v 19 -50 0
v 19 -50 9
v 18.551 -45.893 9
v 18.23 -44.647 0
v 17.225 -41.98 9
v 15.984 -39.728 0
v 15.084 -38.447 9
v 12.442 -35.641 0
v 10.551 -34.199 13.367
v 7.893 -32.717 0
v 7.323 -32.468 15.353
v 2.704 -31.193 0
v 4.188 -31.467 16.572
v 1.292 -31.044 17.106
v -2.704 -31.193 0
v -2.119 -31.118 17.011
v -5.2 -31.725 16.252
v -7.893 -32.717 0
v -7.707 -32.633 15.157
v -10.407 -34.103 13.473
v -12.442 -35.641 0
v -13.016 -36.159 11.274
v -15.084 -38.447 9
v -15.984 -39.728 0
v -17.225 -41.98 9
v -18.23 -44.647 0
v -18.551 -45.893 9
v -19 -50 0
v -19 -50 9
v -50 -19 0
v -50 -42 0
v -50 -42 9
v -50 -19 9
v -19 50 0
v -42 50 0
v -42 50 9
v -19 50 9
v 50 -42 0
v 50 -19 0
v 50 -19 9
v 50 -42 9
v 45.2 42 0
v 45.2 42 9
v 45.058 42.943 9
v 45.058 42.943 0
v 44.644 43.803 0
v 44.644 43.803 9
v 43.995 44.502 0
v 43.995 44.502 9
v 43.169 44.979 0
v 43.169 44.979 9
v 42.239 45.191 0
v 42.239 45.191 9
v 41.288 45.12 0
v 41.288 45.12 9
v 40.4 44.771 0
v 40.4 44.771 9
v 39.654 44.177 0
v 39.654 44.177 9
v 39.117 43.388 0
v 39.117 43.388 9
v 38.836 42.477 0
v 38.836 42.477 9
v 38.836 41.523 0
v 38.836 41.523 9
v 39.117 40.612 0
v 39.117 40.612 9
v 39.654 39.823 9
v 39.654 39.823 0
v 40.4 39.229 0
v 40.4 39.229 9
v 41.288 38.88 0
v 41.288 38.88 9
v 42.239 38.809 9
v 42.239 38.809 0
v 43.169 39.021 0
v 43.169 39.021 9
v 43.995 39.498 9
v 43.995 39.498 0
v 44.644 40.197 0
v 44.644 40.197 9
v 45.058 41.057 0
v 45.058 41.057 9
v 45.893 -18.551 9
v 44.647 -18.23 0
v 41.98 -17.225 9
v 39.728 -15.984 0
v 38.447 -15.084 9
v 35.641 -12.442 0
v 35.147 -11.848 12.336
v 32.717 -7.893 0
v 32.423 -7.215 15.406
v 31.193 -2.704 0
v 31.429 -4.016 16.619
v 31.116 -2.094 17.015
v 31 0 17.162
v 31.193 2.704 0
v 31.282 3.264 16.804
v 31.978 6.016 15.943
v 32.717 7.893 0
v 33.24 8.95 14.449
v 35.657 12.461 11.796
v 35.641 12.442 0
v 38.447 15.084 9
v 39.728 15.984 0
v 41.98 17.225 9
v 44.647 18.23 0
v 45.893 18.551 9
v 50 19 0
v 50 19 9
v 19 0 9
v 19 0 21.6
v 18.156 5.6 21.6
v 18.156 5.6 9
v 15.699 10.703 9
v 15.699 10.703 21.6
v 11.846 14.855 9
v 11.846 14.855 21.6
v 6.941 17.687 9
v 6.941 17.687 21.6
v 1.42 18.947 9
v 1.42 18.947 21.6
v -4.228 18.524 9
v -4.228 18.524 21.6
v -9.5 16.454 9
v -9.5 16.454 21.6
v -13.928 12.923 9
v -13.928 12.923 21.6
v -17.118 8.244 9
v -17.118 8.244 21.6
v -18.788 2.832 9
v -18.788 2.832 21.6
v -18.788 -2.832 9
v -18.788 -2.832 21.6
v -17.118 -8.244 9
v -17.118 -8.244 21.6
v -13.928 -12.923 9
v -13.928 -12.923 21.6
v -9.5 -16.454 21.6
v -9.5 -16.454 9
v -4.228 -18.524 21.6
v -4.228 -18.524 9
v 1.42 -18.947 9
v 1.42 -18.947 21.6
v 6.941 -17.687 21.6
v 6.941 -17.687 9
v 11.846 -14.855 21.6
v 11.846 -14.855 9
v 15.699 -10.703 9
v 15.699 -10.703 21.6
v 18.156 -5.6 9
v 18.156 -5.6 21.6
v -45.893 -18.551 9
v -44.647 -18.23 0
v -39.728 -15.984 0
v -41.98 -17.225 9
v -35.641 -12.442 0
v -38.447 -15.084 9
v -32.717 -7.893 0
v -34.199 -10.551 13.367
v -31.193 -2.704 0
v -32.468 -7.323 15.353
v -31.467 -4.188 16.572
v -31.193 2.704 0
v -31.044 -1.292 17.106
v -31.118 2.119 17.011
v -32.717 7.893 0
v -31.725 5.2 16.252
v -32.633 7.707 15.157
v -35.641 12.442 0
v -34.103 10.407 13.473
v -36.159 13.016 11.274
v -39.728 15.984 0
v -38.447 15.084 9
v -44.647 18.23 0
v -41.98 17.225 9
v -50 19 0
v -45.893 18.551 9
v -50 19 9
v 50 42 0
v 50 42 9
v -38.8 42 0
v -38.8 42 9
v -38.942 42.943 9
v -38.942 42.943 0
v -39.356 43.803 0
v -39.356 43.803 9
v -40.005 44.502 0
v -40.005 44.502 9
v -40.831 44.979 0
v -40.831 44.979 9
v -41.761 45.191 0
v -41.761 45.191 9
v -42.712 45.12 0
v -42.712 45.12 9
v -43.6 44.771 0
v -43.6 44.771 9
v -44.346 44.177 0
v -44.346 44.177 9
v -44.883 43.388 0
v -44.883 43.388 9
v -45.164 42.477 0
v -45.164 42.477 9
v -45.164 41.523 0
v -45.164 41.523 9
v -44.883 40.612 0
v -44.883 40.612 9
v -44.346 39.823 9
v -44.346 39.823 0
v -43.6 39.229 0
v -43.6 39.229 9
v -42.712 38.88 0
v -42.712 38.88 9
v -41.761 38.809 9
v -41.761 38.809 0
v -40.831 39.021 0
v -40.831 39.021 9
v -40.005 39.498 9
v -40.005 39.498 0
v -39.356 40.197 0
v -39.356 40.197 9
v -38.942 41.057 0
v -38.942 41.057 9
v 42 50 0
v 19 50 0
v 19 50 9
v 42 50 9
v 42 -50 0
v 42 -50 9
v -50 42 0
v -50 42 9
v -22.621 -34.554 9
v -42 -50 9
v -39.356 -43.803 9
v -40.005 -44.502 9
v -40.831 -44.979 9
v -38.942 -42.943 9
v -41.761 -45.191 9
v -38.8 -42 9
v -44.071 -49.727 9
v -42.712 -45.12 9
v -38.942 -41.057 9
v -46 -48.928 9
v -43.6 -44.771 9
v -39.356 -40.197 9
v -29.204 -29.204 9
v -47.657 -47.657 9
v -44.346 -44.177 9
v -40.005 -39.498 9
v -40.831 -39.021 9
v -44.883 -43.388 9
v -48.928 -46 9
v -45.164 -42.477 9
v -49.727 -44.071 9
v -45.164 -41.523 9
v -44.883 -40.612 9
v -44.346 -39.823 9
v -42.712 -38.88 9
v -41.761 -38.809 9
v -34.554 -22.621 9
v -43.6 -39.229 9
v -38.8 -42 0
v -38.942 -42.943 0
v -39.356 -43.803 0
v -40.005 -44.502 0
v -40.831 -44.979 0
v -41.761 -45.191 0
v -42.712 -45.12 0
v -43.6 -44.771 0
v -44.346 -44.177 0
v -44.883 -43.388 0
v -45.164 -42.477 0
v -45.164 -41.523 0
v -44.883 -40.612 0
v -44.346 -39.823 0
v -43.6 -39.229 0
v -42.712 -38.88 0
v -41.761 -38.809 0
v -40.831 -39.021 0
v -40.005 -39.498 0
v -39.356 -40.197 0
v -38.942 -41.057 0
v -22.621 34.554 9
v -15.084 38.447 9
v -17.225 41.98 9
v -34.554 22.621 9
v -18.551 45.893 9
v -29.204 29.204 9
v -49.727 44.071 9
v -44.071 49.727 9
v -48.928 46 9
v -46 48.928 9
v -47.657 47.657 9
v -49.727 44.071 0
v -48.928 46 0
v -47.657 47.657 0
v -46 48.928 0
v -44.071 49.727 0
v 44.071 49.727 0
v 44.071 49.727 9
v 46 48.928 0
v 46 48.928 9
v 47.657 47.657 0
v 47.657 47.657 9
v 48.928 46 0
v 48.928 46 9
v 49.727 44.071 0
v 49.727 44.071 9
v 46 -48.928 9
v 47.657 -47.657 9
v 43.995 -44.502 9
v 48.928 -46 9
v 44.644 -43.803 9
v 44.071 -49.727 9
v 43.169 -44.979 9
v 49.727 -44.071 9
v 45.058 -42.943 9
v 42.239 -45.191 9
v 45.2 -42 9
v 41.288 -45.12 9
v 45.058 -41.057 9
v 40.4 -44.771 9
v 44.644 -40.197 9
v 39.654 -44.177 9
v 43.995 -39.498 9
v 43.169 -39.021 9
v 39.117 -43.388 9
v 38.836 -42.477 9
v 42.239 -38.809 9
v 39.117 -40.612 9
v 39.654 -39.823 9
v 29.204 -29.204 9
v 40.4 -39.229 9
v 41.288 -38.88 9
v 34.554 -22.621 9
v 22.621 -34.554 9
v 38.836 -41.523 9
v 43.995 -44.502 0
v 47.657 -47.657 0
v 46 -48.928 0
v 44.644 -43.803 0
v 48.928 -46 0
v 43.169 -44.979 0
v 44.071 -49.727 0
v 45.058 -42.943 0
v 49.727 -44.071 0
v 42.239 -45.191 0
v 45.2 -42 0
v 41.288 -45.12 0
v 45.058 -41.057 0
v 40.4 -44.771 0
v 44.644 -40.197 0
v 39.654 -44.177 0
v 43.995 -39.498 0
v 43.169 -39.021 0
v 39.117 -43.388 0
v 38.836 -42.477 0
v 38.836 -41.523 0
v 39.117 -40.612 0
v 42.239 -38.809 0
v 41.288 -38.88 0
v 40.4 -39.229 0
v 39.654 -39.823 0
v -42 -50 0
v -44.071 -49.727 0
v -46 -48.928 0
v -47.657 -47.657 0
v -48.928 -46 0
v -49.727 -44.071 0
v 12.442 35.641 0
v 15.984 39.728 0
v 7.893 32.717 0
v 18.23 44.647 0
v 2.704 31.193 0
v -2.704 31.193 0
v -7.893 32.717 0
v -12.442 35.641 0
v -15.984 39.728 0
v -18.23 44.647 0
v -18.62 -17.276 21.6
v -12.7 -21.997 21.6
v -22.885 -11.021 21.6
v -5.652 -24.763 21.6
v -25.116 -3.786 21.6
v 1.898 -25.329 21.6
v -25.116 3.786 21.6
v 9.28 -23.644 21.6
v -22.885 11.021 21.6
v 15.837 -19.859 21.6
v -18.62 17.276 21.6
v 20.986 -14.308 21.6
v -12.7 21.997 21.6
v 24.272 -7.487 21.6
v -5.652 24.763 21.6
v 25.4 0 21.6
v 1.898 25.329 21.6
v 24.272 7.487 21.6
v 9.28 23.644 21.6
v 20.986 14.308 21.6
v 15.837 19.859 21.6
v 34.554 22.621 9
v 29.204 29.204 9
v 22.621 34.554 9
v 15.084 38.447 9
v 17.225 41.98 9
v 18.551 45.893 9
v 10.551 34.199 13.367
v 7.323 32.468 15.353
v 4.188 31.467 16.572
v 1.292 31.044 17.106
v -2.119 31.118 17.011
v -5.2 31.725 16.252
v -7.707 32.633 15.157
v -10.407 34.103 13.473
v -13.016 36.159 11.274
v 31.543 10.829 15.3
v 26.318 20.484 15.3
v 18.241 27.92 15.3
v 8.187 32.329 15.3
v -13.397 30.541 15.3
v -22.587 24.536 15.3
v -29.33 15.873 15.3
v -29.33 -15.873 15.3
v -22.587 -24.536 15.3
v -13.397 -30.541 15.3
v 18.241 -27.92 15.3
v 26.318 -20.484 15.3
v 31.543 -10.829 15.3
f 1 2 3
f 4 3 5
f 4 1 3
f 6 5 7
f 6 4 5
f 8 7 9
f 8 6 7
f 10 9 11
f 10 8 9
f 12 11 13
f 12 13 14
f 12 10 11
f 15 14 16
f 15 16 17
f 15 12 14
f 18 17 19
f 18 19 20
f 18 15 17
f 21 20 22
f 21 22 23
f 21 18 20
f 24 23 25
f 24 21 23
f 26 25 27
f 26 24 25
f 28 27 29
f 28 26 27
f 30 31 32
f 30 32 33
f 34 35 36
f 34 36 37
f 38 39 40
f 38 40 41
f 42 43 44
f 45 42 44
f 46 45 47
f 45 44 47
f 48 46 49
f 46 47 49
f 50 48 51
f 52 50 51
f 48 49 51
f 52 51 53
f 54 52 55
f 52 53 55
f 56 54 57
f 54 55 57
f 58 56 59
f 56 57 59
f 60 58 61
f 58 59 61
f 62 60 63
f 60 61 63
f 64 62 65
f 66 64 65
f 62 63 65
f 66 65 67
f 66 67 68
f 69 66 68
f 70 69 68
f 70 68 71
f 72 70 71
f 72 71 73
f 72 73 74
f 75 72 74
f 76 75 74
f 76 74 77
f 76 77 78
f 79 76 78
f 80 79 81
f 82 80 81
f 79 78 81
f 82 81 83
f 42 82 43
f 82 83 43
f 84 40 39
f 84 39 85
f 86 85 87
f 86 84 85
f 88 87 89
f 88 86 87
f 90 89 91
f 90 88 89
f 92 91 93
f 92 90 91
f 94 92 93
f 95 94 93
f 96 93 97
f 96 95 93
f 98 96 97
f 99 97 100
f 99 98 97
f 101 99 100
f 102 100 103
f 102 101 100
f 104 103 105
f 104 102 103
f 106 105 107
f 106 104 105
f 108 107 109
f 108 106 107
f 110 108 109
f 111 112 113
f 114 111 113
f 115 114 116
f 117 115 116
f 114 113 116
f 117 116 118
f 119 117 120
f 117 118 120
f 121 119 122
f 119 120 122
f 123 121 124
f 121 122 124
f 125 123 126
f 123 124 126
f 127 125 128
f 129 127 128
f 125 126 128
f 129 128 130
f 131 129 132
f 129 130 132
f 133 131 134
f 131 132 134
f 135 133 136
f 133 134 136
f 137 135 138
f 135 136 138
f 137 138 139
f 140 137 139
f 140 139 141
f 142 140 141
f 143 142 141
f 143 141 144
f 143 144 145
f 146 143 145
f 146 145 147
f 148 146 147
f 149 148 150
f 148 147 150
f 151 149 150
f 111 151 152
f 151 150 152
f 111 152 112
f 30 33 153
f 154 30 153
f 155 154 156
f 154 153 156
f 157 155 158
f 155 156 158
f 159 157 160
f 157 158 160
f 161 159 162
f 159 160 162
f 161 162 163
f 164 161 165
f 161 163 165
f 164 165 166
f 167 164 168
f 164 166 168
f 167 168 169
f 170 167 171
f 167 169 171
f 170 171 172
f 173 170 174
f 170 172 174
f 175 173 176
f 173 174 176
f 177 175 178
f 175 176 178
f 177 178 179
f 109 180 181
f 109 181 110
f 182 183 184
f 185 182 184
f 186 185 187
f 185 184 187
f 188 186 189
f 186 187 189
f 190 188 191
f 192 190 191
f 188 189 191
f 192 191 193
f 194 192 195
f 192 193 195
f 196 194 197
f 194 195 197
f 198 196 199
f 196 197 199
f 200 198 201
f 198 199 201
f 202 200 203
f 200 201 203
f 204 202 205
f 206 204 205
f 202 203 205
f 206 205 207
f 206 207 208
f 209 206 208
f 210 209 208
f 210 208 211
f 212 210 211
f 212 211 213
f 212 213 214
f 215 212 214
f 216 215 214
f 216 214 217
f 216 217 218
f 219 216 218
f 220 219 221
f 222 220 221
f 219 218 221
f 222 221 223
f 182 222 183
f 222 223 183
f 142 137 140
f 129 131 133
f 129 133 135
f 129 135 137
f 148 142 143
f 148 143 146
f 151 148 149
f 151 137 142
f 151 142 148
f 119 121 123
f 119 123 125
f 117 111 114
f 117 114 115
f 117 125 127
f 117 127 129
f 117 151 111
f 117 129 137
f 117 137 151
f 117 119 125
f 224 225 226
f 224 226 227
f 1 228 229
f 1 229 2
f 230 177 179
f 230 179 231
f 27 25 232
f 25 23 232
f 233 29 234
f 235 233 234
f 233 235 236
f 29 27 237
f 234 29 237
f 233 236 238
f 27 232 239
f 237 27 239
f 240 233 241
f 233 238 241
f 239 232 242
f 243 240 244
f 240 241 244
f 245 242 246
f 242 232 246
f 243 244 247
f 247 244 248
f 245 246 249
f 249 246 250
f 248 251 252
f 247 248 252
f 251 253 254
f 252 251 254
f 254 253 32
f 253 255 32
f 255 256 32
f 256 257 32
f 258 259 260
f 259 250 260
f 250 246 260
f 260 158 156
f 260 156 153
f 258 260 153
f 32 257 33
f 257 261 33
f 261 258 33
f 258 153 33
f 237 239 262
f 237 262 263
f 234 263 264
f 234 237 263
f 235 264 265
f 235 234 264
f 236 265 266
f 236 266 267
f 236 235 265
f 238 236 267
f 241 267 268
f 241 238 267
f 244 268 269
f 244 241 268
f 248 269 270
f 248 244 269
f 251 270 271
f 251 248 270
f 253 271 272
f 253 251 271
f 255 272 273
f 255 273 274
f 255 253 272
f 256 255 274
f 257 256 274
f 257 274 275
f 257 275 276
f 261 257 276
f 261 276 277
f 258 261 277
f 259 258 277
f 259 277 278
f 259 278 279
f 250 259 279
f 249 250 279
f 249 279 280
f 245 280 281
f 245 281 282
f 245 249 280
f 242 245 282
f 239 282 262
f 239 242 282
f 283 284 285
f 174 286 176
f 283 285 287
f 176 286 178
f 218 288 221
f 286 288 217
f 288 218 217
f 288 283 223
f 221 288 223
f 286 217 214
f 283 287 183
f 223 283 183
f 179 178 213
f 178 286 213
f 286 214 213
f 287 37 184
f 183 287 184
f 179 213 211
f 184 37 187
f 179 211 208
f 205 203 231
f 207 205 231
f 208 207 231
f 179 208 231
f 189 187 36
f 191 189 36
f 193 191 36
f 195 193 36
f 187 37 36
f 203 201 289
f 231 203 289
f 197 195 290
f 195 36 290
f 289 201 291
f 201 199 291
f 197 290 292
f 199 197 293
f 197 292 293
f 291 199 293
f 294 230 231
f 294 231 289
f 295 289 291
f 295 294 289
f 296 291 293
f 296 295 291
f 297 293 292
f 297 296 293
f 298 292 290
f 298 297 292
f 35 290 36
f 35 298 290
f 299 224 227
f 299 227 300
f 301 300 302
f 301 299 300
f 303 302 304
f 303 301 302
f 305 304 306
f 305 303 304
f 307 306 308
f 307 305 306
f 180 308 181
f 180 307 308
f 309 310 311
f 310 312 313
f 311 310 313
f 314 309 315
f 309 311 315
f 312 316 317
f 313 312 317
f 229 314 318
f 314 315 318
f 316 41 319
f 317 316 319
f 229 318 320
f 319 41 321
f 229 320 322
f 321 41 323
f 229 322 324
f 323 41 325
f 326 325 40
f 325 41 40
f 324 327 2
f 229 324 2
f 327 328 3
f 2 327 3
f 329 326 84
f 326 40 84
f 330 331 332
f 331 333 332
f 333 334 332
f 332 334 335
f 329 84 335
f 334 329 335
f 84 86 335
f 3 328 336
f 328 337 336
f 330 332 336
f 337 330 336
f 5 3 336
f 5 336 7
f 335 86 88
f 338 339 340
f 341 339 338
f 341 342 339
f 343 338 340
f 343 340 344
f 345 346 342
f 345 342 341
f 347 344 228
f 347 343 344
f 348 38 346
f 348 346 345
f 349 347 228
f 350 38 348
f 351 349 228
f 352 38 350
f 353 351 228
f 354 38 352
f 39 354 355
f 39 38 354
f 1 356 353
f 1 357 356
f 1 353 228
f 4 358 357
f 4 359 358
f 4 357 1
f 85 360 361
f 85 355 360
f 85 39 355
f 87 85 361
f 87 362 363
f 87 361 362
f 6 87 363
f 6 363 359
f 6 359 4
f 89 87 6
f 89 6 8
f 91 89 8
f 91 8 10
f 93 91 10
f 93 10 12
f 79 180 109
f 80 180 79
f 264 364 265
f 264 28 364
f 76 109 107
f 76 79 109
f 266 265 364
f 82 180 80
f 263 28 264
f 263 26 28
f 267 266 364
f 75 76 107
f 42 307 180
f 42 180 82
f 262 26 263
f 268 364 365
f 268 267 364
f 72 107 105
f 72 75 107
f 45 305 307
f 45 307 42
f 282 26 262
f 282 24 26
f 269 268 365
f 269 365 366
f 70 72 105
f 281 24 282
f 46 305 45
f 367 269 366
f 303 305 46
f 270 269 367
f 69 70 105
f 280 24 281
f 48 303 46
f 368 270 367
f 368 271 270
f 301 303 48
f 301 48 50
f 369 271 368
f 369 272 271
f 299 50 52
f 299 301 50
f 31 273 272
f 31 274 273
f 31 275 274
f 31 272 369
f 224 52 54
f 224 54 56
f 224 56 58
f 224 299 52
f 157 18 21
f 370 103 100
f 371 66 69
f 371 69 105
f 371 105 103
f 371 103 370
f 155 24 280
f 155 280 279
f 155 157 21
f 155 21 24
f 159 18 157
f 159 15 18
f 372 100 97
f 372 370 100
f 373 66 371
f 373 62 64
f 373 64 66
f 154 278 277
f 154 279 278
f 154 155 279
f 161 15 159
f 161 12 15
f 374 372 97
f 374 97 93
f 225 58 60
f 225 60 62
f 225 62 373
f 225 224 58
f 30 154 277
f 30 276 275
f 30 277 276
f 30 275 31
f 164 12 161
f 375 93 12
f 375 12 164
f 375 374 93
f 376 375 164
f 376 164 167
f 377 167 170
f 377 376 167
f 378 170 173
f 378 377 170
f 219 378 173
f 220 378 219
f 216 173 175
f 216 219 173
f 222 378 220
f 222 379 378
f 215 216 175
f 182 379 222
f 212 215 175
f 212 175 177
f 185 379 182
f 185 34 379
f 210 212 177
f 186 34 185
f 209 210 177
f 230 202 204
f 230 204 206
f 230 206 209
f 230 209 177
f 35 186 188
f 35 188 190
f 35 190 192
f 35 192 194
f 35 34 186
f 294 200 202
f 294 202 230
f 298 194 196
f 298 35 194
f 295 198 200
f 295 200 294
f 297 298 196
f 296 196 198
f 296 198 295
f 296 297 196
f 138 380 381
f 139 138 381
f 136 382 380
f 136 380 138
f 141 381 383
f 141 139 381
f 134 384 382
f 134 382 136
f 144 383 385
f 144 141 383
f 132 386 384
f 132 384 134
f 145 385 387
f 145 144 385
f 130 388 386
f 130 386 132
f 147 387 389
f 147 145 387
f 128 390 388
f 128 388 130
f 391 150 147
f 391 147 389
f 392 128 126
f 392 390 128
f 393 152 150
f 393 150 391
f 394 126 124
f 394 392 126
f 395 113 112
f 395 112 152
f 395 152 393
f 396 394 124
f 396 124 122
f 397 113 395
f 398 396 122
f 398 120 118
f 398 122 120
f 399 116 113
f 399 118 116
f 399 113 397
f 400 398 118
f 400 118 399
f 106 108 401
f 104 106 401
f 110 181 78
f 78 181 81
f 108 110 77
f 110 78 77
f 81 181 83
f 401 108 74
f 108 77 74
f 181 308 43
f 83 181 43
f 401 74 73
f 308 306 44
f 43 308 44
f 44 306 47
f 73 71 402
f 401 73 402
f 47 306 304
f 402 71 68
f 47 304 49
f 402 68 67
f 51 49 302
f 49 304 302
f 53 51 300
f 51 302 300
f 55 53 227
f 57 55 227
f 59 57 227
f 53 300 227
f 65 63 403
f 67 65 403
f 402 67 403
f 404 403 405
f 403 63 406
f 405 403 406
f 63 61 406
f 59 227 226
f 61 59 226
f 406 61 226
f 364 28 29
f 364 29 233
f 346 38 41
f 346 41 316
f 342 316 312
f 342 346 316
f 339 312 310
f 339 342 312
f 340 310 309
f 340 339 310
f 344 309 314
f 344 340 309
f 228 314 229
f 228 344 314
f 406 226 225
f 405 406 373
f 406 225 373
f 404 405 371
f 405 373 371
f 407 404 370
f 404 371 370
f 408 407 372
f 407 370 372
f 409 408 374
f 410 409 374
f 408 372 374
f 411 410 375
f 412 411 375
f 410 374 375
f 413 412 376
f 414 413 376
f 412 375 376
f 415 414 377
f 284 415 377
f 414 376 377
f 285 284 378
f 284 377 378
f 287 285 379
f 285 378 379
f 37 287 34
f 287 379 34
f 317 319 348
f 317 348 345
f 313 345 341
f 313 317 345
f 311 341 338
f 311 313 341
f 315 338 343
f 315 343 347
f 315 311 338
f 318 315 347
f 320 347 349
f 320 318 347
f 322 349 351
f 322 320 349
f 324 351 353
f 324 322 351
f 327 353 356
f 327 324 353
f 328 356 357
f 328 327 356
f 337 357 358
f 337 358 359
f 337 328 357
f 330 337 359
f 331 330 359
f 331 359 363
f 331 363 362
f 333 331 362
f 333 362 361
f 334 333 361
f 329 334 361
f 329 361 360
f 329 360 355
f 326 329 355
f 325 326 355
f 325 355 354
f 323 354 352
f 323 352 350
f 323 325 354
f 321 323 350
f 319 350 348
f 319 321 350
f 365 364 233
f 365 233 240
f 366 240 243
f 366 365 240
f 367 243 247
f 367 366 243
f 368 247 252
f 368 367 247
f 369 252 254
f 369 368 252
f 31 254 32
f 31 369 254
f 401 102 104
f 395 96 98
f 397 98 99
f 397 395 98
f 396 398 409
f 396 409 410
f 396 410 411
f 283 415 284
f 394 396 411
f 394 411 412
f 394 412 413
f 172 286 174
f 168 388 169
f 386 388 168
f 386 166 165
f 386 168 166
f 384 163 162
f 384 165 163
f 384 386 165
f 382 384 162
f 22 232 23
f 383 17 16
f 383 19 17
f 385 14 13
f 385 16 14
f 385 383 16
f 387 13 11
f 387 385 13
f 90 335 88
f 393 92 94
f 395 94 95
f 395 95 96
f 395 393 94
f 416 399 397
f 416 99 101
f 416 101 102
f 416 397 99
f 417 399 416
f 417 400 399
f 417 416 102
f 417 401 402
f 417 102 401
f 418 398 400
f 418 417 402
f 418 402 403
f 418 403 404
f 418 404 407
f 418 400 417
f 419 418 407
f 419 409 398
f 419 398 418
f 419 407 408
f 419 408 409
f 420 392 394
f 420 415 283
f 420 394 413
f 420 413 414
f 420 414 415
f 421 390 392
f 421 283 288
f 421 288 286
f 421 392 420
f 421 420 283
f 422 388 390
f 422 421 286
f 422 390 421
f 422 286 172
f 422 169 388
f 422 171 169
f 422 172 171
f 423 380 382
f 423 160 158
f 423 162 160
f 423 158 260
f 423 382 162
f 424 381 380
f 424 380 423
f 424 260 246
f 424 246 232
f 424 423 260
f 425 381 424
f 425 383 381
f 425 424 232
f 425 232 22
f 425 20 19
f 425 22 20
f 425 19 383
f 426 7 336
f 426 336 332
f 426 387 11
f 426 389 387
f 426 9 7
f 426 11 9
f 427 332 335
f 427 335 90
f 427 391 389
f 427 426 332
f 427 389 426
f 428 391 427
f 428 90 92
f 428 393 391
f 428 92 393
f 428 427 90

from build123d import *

# Parameters (mm, degrees)
BOSS_EXTRUDE1_DEPTH     = 9
SKETCH2_R               = 41.3
SKETCH3_R               = 25.4
SKETCH4_R               = 19
CUT_EXTRUDE1_DEPTH      = 12.6
SKETCH5_R               = 3.2
CUT_EXTRUDE2_DEPTH      = 9
CUT_EXTRUDE3_DEPTH      = 72.824508369
CUT_EXTRUDE3_DEPTH_BACK = 72.824508369
CUT_EXTRUDE4_DEPTH      = 72.824508439


with BuildPart() as part:
    # Sketch1 → Boss-Extrude1 (new body)
    with BuildSketch(Plane.XY):
        with BuildLine():
            Line((-42, 50), (42, 50))
            ThreePointArc((42, 50), (47.656854249, 47.656854249), (50, 42))
            Line((50, 42), (50, -42))
            ThreePointArc((50, -42), (47.656854249, -47.656854249), (42, -50))
            Line((42, -50), (-42, -50))
            ThreePointArc((-42, -50), (-47.656854249, -47.656854249), (-50, -42))
            Line((-50, -42), (-50, 42))
            ThreePointArc((-50, 42), (-47.656854249, 47.656854249), (-42, 50))
        make_face()
    extrude(amount=BOSS_EXTRUDE1_DEPTH)

    # Sketch2 → Loft1 section 0
    with BuildSketch(Plane.XY.offset(9)):
        Circle(SKETCH2_R)
    # Sketch3 → Loft1 section 1
    with BuildSketch(Plane.XY.offset(21.6)):
        Circle(SKETCH3_R)
    loft()

    # Sketch4 → Cut-Extrude1 (cut)
    with BuildSketch(Plane.XY.offset(21.6)):
        Circle(SKETCH4_R)
    extrude(amount=-CUT_EXTRUDE1_DEPTH, mode=Mode.SUBTRACT)

    # Sketch5 → Cut-Extrude2 (cut)
    with BuildSketch(Plane.XY.offset(9)):
        with Locations((-42, 42)):
            Circle(SKETCH5_R)
        with Locations((42, 42)):
            Circle(SKETCH5_R)
    cut_extrude2 = extrude(amount=-CUT_EXTRUDE2_DEPTH, mode=Mode.SUBTRACT)

    # Mirror1: Cut-Extrude2 across plane
    add(cut_extrude2.mirror(Plane.ZX), mode=Mode.SUBTRACT)

    # Sketch6 → Cut-Extrude3 (cut, two sides: drawn at the far end of the back side and taken through both)
    with BuildSketch(Plane.XY.offset(9).offset(-CUT_EXTRUDE3_DEPTH_BACK)):
        with BuildLine():
            Line((-19, -50), (19, -50))
            ThreePointArc((19, -50), (0, -31), (-19, -50))
        make_face()
        with BuildLine():
            Line((-19, 50), (19, 50))
            ThreePointArc((19, 50), (0, 31), (-19, 50))
        make_face()
    extrude(amount=CUT_EXTRUDE3_DEPTH + CUT_EXTRUDE3_DEPTH_BACK, mode=Mode.SUBTRACT)

    # Sketch8 → Cut-Extrude4 (cut, symmetric)
    with BuildSketch(Plane.XY.offset(9)):
        with BuildLine():
            Line((50, 19), (50, -19))
            ThreePointArc((50, -19), (31, 0), (50, 19))
        make_face()
    cut_extrude4 = extrude(amount=CUT_EXTRUDE4_DEPTH, both=True, mode=Mode.SUBTRACT)

    # Mirror3: Cut-Extrude4 across plane
    add(cut_extrude4.mirror(Plane(origin=(0, 0, 0), x_dir=(0, 0, 1), z_dir=(1, 0, 0))), mode=Mode.SUBTRACT)


solid = part.part
